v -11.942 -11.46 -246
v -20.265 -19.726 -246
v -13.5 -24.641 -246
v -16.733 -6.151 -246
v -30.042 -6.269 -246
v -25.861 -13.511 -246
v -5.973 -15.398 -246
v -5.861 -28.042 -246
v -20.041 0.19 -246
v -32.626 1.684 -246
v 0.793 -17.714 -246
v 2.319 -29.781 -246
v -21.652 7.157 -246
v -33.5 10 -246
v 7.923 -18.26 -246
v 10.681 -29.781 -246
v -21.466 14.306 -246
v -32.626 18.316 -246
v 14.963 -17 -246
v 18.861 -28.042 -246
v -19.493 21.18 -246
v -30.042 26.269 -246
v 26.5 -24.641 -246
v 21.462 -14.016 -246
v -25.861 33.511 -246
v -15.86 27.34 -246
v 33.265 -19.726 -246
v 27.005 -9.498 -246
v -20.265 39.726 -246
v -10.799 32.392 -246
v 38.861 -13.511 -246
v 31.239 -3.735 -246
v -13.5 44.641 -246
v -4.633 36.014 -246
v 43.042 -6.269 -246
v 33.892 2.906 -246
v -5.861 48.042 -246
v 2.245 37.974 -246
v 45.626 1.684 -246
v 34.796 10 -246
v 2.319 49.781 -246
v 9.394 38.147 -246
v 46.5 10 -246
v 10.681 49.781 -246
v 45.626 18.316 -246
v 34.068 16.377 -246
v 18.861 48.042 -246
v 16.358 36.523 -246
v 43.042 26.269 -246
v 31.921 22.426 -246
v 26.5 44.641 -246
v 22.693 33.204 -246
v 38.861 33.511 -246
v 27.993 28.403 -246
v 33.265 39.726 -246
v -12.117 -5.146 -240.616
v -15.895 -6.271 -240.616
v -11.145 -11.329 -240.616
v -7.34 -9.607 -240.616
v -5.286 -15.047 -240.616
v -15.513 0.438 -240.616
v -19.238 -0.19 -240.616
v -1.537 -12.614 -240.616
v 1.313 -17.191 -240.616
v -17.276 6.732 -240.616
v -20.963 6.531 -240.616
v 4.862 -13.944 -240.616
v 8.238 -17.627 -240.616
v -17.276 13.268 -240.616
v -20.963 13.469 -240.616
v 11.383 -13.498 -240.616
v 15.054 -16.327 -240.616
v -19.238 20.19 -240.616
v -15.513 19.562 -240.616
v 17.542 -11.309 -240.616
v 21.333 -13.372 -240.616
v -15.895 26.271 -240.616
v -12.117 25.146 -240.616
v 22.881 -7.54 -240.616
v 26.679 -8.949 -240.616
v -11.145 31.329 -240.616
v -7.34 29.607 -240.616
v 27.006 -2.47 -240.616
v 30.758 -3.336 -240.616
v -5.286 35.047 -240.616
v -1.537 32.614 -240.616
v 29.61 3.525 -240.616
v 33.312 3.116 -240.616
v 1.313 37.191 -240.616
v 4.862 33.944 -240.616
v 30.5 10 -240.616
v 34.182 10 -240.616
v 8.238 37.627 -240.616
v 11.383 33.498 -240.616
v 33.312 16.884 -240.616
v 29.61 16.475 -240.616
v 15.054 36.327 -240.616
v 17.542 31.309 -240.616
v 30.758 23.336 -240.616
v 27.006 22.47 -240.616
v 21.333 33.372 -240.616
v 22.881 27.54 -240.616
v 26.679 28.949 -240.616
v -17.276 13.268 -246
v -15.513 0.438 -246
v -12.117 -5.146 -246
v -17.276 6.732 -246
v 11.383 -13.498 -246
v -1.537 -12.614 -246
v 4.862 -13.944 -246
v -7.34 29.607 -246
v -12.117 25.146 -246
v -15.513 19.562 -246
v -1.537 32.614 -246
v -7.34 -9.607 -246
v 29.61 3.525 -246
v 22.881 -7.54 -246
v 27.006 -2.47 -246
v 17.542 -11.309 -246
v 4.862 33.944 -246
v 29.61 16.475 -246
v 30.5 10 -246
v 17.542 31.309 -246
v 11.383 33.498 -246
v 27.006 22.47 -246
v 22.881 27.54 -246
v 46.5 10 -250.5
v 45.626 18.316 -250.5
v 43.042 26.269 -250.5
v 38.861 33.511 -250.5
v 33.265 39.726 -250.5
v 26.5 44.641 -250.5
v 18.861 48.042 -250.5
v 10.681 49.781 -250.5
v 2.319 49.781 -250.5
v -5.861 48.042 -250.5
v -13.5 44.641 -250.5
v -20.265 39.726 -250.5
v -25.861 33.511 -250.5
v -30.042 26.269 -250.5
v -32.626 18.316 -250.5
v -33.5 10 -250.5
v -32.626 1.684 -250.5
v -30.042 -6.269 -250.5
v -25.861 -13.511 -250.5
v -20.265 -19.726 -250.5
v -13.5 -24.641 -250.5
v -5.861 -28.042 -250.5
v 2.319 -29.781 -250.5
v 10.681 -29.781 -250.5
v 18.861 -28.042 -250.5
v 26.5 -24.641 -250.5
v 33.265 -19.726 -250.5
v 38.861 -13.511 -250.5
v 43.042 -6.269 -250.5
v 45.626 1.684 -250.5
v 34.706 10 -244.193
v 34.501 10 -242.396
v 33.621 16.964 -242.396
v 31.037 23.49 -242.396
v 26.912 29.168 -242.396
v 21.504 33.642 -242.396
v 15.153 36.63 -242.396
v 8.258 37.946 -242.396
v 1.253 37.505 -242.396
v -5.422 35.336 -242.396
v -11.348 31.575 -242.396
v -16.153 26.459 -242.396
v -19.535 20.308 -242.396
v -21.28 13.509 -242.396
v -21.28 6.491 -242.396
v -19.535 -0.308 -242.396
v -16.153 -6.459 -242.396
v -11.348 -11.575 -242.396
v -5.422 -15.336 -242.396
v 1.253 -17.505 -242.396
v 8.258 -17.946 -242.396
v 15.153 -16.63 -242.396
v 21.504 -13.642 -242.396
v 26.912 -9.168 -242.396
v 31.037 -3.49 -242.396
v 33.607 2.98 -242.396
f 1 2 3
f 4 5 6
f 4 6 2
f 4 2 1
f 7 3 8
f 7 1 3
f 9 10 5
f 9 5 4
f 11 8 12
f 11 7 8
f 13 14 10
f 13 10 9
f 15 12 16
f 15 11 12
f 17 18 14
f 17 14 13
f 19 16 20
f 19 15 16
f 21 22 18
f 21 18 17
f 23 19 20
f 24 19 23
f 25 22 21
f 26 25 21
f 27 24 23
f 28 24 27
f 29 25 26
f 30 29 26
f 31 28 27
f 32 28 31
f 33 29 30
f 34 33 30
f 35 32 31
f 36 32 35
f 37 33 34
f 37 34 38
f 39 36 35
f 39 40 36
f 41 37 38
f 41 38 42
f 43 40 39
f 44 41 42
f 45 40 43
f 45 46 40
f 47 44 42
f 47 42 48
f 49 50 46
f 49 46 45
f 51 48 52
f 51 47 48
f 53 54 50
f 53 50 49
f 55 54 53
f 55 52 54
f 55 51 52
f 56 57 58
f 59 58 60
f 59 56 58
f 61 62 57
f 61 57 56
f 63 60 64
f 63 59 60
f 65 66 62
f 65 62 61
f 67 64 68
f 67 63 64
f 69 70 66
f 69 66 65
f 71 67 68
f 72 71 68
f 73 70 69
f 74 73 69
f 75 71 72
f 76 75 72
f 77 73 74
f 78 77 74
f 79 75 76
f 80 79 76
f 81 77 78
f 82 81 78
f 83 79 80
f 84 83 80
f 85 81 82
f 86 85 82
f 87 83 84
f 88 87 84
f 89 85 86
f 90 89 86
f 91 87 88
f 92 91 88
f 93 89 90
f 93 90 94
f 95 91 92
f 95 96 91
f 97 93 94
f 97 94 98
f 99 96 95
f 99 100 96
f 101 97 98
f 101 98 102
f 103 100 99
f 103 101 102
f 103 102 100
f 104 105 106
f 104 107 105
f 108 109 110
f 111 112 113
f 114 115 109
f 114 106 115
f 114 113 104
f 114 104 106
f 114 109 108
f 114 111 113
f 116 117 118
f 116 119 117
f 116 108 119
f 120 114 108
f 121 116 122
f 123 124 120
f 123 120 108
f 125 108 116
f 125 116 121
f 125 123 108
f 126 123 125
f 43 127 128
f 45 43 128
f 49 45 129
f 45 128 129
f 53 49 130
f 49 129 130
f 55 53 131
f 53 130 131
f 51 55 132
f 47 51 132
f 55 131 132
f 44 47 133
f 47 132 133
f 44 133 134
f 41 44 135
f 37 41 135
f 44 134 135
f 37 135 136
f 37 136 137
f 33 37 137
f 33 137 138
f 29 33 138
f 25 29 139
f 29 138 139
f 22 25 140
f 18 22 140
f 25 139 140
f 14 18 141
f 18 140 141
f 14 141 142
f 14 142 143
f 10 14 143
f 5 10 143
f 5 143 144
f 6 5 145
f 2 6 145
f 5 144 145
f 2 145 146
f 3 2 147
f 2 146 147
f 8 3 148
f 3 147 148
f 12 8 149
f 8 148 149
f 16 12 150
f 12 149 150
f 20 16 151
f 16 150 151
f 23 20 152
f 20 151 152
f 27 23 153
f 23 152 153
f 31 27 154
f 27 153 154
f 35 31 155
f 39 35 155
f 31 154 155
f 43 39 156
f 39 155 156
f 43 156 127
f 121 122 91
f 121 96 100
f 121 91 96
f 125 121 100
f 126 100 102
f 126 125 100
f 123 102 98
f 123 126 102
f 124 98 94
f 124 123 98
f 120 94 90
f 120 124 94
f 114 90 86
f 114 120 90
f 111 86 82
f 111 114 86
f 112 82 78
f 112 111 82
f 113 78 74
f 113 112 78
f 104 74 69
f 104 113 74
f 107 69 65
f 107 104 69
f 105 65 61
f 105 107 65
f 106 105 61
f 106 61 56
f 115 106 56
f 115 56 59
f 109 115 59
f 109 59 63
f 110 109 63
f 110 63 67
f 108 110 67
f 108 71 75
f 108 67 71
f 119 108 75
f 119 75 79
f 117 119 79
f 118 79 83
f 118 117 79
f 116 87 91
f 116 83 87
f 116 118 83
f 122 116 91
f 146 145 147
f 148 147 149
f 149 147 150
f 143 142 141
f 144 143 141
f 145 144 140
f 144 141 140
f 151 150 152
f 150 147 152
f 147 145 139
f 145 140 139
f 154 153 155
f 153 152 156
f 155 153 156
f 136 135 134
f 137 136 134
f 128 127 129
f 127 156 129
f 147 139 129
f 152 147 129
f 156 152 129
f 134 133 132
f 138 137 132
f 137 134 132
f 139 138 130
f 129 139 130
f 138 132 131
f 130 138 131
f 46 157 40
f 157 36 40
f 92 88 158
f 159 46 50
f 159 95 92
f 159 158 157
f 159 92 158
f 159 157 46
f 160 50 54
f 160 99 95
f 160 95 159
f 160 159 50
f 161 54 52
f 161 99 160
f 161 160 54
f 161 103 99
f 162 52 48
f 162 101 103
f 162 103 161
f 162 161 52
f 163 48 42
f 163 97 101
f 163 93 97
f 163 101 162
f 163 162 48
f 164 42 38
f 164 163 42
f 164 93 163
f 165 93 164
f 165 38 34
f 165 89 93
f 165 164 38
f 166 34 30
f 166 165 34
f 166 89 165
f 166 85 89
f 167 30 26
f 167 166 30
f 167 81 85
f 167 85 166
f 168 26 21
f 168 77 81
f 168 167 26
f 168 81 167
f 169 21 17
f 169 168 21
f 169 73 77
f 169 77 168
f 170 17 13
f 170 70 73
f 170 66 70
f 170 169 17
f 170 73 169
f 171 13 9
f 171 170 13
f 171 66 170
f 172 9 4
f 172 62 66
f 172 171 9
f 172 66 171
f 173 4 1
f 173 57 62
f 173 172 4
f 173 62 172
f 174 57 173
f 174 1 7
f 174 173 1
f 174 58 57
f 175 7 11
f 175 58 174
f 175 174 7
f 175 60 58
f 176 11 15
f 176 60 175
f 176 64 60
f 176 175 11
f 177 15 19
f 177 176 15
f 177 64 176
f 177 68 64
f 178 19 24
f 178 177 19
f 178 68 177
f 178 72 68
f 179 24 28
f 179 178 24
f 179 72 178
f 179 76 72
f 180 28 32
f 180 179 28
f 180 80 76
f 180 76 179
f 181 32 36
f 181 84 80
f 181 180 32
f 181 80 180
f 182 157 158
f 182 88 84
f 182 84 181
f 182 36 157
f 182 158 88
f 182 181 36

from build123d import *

# Parameters (mm, degrees)
CYLINDER144_R     = 40
CYLINDER144_DEPTH = 4.5
CYLINDER145_R     = 24
CYLINDER145_DEPTH = 7


with BuildPart() as base014:
    # Cylinder144 → Cylinder144 (new body)
    with BuildSketch(Plane(origin=(136, 0, 65), x_dir=(1, 0, 0), z_dir=(0, 0, 1))):
        Circle(CYLINDER144_R)
    extrude(amount=CYLINDER144_DEPTH)


with BuildPart() as basecut003:
    # Cylinder145 → Cylinder145 (new body)
    with BuildSketch(Plane(origin=(5, 0, 74), x_dir=(1, 0, 0), z_dir=(0, 0, 1))):
        Circle(CYLINDER145_R)
    extrude(amount=CYLINDER145_DEPTH)


with BuildPart() as base003:
    # Sphere006 → Sphere006 (revolve)
    with BuildSketch(Plane(origin=(5, 0, 74), x_dir=(1, 0, 0), z_dir=(0, -1, 0))):
        with BuildLine():
            ThreePointArc((28.3, 0), (28.14497, 2.958156), (27.681577, 5.883901))
            Line((27.681577, 5.883901), (0, 5.883901))
            Line((0, 5.883901), (0, 0))
            Line((0, 0), (28.3, 0))
        make_face()
    revolve(axis=Axis((5, 0, 74), (0, 0, 1)))

    # Cut038: cut baseCut003
    add(basecut003.part, mode=Mode.SUBTRACT)


with BuildPart() as base003_1:
    # Cut038 placement: moved
    add(base003.part.moved(Location((131, 0, -5))))

    # Fusion089: union base014
    add(base014.part)


with BuildPart() as base003_2:
    # Fusion089 placement: moved
    add(base003_1.part.moved(Location((-129.5, 10, -315.5))))


solid = base003_2.part
